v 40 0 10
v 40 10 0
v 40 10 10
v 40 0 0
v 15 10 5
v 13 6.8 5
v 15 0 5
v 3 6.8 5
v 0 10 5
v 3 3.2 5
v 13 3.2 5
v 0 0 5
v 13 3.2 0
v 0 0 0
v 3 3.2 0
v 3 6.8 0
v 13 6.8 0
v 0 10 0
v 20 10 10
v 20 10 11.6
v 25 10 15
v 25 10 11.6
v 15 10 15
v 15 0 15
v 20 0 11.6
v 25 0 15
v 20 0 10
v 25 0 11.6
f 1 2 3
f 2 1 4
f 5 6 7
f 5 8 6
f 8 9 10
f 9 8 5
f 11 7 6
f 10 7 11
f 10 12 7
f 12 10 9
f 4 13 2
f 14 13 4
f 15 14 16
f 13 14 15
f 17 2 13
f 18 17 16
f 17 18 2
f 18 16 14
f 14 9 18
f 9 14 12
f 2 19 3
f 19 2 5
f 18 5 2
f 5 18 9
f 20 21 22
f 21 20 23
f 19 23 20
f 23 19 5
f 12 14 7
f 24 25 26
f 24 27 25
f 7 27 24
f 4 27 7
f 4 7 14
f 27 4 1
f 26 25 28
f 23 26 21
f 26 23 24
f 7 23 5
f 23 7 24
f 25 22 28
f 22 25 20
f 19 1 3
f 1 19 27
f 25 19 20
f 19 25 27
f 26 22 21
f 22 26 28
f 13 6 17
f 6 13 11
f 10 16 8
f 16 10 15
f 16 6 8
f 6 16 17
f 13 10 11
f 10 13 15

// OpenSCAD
W=29;
L=12;
e=5;
H=10;
$fn=100;
module base()
{
difference()
{
union()
{
cube([L,W+20,3]);
    translate([0,10,0]) cube([L,W,H]);
}
translate([L/2,5,-1]) cylinder(h=20,d=3.4);
translate([L/2,W+20-5,-1]) cylinder(h=20,d=3.4);
translate([L/2,W/2+10,-1]) cylinder(h=20,d=5.4);
translate([L/2,W/2+10,-1]) cylinder(h=5,d=10.2,$fn=6);
}
}

module attache()
{
  difference()
{
union()
{
cube([30,W+10,H+1.6+2]);

}
translate([30-5,W/2+5-10,-1]) cylinder(h=20,d=3.4);
translate([30-5,W/2+5+10,-1]) cylinder(h=20,d=3.4);
translate([0,(W+10-29)/2,H]) cube([15,29,1.6]);
translate([30-10,-1,5]) cube([20,50,10]);
}  
}

module attachemilieu()
{
 difference(){
      union() {
        cube([40,10,5]);
        translate([15,0,0])cube([25,10,H+5]);
       
      }
       translate([20,0,H]) cube([15,10,1.6]);
      
      translate([25,-1,H]) cube([30,35,10]);
      translate([3,5-1.8,-1]) cube([10,3.6,10]);
//    translate([L/2,5,-1]) cylinder(h=10,d=3.4);
//    translate([L/2,W+20-5,-1]) cylinder(h=10,d=3.4);
//    translate([L/2,W/2+10,-1]) cylinder(h=10,d=5.4);
//    translate([L/2,W/2+10,-1]) cylinder(h=5,d=10.2,$fn=6);
 }
}

//rotate([0,-90,0]) 
//attache();
//base();
attachemilieu();
